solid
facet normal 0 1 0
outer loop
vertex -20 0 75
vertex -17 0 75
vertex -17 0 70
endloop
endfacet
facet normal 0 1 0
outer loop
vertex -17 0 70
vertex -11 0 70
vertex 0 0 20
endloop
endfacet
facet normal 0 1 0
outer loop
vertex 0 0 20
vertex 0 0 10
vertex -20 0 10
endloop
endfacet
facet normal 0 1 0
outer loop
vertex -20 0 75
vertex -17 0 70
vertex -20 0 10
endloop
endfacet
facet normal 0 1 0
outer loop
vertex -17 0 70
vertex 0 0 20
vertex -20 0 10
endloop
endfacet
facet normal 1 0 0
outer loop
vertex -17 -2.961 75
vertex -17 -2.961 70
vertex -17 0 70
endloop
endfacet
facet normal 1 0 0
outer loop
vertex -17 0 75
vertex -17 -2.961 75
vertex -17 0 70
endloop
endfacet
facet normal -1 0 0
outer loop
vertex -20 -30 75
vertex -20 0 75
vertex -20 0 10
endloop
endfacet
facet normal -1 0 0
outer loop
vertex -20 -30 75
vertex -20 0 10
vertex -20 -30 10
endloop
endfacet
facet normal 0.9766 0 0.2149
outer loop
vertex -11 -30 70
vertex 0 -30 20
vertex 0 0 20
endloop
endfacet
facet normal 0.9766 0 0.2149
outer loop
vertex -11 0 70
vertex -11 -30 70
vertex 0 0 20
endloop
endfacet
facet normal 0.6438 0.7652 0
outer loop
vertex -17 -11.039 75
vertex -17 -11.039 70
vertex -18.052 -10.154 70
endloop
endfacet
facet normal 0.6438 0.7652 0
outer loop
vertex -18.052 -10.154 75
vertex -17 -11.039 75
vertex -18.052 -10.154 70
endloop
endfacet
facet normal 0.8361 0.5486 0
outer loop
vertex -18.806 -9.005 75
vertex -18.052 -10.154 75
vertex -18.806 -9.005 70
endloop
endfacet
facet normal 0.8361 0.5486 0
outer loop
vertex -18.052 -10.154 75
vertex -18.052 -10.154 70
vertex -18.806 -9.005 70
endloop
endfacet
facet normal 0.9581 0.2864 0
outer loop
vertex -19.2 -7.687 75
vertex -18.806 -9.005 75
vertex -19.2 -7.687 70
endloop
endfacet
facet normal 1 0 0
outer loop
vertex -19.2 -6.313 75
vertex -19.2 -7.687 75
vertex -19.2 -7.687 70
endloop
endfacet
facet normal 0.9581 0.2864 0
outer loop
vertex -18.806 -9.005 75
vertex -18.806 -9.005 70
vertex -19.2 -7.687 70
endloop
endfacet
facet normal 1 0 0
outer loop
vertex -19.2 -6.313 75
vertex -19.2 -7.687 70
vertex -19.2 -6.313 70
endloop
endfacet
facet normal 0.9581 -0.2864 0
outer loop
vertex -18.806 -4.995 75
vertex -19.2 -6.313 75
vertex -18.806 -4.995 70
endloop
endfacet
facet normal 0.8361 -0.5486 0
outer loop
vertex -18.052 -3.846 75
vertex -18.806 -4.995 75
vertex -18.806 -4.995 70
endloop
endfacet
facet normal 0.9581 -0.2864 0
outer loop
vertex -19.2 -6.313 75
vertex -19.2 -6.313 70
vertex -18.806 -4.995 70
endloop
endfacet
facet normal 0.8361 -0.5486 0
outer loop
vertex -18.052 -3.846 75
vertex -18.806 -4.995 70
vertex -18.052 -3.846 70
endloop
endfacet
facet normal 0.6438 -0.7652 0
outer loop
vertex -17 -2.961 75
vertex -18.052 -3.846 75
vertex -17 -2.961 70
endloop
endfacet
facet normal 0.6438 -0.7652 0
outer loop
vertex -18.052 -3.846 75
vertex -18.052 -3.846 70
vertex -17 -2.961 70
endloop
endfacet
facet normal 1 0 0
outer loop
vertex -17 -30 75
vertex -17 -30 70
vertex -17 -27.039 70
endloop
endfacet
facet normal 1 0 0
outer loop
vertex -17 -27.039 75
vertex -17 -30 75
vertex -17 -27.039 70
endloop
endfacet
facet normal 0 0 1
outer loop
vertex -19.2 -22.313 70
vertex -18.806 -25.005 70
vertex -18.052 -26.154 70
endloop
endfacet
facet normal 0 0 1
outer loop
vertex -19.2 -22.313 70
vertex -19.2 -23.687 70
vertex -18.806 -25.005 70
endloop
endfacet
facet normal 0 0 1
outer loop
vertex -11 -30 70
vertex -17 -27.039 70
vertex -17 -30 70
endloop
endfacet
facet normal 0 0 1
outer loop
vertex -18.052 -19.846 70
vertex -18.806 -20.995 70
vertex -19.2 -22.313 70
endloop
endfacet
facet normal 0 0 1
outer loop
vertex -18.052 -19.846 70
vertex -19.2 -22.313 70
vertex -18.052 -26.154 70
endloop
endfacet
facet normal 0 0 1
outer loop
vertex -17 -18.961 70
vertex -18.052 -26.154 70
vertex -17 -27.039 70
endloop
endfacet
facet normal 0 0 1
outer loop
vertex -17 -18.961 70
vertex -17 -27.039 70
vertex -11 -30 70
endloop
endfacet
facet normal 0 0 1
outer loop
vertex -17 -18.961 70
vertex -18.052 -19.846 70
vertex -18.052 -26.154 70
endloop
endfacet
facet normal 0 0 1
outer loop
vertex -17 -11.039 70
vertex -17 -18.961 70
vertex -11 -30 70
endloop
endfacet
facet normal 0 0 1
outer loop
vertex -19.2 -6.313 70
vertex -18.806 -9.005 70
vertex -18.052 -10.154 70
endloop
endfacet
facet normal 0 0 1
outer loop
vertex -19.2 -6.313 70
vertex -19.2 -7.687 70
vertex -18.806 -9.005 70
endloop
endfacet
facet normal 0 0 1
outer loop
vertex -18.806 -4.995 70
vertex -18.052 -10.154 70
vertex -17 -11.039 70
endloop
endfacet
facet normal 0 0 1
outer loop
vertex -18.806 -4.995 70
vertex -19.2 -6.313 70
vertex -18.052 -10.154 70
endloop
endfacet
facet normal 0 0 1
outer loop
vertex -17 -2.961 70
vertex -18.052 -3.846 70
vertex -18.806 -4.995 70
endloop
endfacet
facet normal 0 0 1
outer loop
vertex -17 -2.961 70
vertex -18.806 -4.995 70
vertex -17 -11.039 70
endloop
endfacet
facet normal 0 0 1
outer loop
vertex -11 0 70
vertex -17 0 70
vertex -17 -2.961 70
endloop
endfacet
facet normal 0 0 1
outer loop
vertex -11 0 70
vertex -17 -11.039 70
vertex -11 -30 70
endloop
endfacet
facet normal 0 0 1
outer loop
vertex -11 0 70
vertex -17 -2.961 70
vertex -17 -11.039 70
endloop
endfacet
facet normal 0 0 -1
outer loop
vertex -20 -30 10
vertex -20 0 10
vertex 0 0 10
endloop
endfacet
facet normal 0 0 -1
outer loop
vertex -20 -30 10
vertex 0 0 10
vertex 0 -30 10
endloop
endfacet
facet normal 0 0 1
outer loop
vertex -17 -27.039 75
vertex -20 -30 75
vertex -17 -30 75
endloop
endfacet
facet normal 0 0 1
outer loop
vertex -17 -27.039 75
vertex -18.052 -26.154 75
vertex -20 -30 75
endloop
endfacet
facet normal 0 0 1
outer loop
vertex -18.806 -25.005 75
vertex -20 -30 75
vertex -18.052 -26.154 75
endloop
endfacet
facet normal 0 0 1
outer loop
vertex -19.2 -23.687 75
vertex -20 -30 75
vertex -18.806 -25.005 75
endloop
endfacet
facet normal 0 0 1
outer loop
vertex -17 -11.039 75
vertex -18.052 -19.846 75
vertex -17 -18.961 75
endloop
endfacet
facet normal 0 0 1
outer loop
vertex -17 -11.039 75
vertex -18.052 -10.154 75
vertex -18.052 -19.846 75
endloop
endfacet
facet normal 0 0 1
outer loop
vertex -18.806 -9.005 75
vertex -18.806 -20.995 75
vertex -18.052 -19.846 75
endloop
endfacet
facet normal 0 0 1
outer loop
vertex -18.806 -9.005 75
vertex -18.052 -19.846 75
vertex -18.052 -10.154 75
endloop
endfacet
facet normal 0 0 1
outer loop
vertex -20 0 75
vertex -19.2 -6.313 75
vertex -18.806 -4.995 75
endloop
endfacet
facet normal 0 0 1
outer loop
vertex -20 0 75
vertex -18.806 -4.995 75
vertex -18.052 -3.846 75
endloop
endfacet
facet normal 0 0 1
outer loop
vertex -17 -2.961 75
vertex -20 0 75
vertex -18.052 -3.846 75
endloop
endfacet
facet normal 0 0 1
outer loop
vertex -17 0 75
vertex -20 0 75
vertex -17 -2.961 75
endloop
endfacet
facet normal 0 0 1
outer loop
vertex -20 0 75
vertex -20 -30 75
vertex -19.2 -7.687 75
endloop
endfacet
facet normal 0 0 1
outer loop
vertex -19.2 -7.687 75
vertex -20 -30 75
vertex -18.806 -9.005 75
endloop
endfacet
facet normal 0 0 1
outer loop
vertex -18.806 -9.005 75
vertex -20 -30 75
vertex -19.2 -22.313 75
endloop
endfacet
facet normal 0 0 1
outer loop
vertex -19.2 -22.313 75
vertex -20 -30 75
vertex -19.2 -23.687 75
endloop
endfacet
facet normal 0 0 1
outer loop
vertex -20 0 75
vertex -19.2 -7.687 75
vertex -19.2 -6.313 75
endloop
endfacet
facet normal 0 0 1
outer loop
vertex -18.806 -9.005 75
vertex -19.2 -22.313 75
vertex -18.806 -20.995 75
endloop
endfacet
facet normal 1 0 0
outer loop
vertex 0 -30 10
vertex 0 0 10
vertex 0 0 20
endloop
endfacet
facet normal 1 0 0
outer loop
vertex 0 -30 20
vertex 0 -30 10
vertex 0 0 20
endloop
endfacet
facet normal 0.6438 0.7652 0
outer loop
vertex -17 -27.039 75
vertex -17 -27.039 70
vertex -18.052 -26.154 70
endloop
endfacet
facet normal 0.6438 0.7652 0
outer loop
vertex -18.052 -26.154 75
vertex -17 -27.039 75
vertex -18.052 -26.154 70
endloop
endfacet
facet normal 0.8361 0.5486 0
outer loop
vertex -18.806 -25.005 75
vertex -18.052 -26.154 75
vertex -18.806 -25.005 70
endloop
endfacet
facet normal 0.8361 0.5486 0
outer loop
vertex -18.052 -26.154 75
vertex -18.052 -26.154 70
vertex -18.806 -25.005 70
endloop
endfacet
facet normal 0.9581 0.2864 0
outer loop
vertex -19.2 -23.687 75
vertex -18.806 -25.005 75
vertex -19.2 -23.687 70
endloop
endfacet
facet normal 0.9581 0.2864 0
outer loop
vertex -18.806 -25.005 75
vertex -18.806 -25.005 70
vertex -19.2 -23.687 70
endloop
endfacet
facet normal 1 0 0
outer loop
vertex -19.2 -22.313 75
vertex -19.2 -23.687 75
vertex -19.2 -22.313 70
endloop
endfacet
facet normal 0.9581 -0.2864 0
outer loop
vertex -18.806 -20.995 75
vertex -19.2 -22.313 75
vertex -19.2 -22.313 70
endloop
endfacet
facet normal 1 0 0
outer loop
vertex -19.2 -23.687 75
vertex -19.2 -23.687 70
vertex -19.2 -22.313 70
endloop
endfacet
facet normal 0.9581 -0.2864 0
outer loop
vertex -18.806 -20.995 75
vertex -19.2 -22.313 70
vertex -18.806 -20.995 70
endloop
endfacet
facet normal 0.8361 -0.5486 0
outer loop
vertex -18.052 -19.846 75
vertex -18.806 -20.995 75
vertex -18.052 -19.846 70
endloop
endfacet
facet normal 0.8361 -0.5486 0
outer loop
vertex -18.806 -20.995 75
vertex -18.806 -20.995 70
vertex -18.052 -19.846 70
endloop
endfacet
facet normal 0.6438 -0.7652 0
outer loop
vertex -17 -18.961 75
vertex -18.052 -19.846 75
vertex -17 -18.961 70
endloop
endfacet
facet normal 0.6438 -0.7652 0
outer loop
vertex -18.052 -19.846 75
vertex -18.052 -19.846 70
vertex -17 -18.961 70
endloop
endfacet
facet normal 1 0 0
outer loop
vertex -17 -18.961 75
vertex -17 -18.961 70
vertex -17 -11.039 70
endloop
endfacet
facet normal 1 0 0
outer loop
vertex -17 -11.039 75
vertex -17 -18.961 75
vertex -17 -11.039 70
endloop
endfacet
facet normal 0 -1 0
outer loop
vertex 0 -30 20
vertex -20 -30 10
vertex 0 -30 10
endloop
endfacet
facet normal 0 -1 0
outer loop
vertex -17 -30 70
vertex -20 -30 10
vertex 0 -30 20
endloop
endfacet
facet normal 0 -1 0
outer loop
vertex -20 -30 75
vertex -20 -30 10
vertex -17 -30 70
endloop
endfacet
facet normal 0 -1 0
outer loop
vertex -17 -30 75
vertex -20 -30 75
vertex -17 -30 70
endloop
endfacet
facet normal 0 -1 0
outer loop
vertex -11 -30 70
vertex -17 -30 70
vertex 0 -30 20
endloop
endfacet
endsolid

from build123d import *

# Parameters (mm, degrees)
F0_W      = 20
F0_H      = 70
F1_DEPTH  = 30
F2_W      = 30
F2_H      = 10
F3_DEPTH  = 10
F4_R      = 2.05
F5_DEPTH  = 10
F6_W      = 11
F6_H      = 30
F7_DEPTH  = 50
F9_DEPTH  = 5
F10_SIZE2 = 10.99999
F10_SIZE  = 49.99999
F11_W     = 30
F11_H     = 10
F12_DEPTH = 25


# Not quite as in the source:
# - a fillet or chamfer is up to 0.001 mm smaller than in the source, because OpenCascade refuses the exact size


with BuildPart() as f1:
    # F0 (on Front) → F1 (new body)
    with BuildSketch(Plane.XZ):
        with Locations((-10, 35)):
            Rectangle(F0_W, F0_H)
    extrude(amount=F1_DEPTH)

    # F2 (on face) → F3 (cut)
    with BuildSketch(Plane(origin=(-20, 0, 0), x_dir=(0, -1, 0), z_dir=(-1, 0, 0))):
        with Locations((15, 5)):
            Rectangle(F2_W, F2_H)
    extrude(amount=-F3_DEPTH, mode=Mode.SUBTRACT)

    # F4 (on face) → F5 (cut, through all)
    with BuildSketch(Plane(origin=(-10, 0, 0), x_dir=(0, -1, 0), z_dir=(-1, 0, 0))):
        with Locations((5, 5)):
            Circle(F4_R)
        with Locations((25, 5)):
            Circle(F4_R)
    extrude(amount=-F5_DEPTH, mode=Mode.SUBTRACT)

    # F6 (on face) → F7 (cut)
    with BuildSketch(Plane.XY.offset(70)):
        with Locations((-5.5, -15)):
            Rectangle(F6_W, F6_H)
    extrude(amount=-F7_DEPTH, mode=Mode.SUBTRACT)

    # F8 (on face) → F9 (join)
    with BuildSketch(Plane.XY.offset(70)):
        with BuildLine():
            ThreePointArc((-17, -11.0388736054), (-19.25, -7), (-17, -2.9611263946))
            Line((-17, -2.9611263946), (-17, 0))
            Line((-17, 0), (-20, 0))
            Line((-20, 0), (-20, -30))
            Line((-20, -30), (-17, -30))
            Line((-17, -30), (-17, -27.0388736054))
            ThreePointArc((-17, -27.0388736054), (-19.25, -23), (-17, -18.9611263946))
            Line((-17, -18.9611263946), (-17, -11.0388736054))
        make_face()
    extrude(amount=F9_DEPTH)

    # F10 (size 50 and 11 in the source; OpenCascade refuses exactly that, so slightly less here)
    f10_edges = [f1.edges().sort_by_distance(p)[0] for p in [
        (-11, -15, 20),
    ]]
    f10_side = f1.faces().sort_by_distance((-11, -15, 45))[0]
    chamfer(f10_edges, length=F10_SIZE, length2=F10_SIZE2, reference=f10_side)

    # F11 (on face) → F12 (cut)
    with BuildSketch(Plane(origin=(-10, 0, 0), x_dir=(0, -1, 0), z_dir=(-1, 0, 0))):
        with Locations((15, 5)):
            Rectangle(F11_W, F11_H)
    extrude(amount=-F12_DEPTH, mode=Mode.SUBTRACT)


solid = f1.part
